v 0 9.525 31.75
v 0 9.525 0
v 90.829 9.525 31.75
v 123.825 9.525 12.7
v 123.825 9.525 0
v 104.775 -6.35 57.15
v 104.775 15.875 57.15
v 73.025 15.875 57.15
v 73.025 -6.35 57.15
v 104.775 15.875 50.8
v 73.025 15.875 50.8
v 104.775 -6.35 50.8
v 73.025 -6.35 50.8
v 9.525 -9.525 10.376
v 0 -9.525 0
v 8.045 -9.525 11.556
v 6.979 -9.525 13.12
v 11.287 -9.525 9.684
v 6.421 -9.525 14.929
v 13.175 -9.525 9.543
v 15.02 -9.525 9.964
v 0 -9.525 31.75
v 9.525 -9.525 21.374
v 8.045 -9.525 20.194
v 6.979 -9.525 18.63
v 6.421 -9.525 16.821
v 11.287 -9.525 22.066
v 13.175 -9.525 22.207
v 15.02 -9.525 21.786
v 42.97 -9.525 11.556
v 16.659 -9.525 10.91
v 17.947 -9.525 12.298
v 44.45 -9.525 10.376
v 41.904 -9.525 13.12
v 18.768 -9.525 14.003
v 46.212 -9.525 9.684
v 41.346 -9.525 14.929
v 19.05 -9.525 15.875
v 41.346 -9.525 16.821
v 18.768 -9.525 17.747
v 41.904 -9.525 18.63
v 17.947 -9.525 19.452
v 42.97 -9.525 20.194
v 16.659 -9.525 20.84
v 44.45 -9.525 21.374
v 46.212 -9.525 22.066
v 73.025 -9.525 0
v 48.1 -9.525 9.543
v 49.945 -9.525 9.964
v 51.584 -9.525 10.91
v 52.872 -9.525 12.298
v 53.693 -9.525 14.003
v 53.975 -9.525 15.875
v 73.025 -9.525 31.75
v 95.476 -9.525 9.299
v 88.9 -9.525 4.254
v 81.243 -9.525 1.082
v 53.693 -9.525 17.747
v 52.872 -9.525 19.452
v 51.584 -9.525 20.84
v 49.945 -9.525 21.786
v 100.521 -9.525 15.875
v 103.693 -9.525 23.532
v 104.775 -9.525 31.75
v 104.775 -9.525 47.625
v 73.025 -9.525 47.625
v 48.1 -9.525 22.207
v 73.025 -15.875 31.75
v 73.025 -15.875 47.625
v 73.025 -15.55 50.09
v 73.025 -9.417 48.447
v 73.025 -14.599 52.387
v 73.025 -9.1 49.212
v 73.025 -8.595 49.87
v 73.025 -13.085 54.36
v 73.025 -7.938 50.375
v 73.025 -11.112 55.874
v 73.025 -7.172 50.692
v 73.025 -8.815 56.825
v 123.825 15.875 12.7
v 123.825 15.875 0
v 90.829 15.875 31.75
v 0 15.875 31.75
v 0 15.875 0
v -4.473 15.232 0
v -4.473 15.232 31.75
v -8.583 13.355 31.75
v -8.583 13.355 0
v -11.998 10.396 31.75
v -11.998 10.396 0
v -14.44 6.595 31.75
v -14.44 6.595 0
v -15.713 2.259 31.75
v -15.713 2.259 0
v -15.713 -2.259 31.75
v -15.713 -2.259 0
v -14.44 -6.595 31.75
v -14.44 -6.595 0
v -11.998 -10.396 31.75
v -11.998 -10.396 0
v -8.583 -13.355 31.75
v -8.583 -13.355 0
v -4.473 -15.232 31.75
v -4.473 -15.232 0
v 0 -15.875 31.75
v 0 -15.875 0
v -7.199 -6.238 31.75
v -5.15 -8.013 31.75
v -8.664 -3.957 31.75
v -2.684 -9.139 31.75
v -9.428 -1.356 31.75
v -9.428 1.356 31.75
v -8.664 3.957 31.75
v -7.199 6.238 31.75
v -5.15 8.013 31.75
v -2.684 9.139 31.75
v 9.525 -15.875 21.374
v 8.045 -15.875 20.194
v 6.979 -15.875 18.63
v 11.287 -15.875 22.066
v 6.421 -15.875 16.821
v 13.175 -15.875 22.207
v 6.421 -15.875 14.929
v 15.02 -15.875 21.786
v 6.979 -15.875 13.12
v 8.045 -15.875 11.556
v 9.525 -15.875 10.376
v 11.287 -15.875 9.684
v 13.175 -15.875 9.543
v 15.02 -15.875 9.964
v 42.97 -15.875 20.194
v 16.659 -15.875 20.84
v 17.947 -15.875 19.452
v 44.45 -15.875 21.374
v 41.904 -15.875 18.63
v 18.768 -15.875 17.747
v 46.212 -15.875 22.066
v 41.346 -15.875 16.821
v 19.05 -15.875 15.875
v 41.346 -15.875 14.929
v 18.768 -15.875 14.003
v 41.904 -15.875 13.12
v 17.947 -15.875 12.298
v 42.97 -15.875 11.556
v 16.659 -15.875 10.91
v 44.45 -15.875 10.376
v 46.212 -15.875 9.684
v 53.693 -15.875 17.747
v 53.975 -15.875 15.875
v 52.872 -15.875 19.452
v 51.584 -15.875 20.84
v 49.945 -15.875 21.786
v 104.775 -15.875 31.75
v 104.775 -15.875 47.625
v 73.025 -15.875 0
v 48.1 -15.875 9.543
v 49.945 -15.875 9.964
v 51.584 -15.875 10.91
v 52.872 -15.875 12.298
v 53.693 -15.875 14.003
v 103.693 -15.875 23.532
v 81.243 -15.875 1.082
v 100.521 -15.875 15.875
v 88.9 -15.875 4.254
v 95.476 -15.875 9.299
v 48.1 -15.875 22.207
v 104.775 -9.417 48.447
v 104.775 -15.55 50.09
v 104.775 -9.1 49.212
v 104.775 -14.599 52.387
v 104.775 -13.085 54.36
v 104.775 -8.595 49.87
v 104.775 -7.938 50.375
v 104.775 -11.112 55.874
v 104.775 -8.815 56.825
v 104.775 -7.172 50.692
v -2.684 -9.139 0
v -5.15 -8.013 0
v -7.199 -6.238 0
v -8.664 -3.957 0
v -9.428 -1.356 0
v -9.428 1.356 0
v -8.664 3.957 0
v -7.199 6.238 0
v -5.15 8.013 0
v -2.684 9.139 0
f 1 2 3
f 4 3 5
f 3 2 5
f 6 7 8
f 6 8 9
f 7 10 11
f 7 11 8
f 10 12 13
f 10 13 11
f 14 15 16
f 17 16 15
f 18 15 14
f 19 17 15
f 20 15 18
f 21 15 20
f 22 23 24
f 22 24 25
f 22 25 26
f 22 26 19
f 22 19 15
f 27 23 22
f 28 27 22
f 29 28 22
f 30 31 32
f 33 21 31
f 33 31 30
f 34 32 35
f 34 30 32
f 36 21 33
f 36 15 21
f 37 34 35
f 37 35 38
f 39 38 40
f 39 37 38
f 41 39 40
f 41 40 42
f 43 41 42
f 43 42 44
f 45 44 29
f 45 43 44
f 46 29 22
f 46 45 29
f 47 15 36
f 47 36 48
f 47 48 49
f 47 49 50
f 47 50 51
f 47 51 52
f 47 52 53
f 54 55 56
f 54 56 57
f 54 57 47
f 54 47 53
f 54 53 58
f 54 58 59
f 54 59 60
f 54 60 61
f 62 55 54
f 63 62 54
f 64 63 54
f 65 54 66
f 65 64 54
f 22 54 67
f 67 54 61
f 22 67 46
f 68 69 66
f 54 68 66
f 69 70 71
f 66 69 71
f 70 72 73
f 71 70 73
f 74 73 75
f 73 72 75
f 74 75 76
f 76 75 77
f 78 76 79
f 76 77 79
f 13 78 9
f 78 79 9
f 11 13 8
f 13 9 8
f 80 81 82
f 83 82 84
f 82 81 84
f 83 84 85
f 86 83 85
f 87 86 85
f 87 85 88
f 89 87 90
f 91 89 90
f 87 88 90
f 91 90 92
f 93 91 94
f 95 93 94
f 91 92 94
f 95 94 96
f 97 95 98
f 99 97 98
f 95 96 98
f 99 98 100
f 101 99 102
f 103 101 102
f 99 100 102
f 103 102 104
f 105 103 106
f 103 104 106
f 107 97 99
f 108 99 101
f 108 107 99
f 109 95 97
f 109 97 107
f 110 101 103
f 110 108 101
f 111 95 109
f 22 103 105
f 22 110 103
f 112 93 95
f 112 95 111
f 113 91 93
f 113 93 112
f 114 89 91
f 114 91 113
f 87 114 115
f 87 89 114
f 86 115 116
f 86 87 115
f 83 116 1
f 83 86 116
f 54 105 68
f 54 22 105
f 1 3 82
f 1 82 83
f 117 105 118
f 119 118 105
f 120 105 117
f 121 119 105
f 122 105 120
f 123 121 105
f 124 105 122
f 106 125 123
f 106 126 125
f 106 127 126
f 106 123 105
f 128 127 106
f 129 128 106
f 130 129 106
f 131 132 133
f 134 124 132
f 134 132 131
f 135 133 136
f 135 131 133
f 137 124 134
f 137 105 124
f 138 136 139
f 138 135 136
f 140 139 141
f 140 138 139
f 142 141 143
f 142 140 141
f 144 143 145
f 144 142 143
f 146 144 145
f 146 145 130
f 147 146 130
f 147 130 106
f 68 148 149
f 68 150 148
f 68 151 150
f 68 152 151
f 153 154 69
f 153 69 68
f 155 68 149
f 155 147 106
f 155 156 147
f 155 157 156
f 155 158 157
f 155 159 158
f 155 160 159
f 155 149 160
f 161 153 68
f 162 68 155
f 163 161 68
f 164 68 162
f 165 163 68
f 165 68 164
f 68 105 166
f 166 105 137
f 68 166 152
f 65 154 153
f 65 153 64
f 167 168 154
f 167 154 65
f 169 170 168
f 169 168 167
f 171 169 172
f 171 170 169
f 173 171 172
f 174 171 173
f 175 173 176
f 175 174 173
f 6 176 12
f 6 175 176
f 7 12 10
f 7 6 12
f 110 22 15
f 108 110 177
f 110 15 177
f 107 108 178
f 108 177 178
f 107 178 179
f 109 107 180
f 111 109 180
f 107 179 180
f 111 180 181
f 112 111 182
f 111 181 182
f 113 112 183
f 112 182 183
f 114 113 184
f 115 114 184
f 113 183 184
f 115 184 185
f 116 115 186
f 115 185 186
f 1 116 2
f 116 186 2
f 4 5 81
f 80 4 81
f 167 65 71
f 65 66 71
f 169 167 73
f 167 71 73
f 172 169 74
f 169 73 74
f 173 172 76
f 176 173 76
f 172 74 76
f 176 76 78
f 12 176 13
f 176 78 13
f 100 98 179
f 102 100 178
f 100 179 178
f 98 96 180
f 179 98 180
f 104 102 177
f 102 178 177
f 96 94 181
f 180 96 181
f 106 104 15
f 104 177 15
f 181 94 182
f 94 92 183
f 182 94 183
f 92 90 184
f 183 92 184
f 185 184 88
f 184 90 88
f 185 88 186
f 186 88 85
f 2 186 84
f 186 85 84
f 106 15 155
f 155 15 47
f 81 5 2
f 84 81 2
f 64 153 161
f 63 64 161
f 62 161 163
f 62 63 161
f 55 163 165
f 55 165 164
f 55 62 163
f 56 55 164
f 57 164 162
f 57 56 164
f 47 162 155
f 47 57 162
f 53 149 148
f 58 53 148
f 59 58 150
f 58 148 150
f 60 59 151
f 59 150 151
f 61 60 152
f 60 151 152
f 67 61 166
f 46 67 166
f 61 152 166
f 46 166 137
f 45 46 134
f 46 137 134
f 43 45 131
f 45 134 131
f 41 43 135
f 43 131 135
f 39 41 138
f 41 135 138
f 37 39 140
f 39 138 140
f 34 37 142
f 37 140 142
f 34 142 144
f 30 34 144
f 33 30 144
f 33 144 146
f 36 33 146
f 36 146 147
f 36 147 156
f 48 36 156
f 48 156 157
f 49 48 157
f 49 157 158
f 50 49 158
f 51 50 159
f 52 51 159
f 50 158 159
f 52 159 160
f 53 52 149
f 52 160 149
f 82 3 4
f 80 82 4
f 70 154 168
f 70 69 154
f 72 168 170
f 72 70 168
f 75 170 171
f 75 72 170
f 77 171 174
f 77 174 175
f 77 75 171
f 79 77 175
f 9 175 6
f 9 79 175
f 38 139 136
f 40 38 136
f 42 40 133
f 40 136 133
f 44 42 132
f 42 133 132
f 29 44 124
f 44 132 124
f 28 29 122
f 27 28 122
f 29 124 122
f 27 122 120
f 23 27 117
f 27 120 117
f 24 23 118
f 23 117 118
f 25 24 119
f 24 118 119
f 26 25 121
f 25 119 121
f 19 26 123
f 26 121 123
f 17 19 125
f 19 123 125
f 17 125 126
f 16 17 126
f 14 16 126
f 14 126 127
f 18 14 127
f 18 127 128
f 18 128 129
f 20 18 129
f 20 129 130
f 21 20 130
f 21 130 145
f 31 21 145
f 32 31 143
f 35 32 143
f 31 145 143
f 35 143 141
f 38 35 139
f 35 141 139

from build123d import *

# Parameters (mm, degrees)
F1_DEPTH  = 31.75
F3_DEPTH  = 25.4
F5_DEPTH  = 31.75
F7_R      = 31.75
F8_R      = 9.525
F9_R      = 3.175
F10_R     = 6.35
F11_DEPTH = 6.35


with BuildPart() as f1:
    # F0 (on Top) → F1 (new body)
    with BuildSketch(Plane.XY):
        with BuildLine():
            Line((123.825, 15.875), (0, 15.875))
            ThreePointArc((0, 15.875), (-15.875, 0), (0, -15.875))
            Line((0, -15.875), (104.775, -15.875))
            Line((104.775, -15.875), (104.775, -9.525))
            Line((104.775, -9.525), (0, -9.525))
            ThreePointArc((0, -9.525), (-9.525, 0), (0, 9.525))
            Line((0, 9.525), (123.825, 9.525))
            Line((123.825, 9.525), (123.825, 15.875))
        make_face()
    extrude(amount=F1_DEPTH)

    # F2 (on face) → F3 (cut)
    with BuildSketch(Plane.XZ.offset(-9.525)):
        Polygon((123.825, 31.75), (90.829432, 31.75), (123.825, 12.7), align=None)
    extrude(amount=-F3_DEPTH, mode=Mode.SUBTRACT)


with BuildPart() as f5:
    # F4 (on face) → F5 (new body)
    with BuildSketch(Plane.YZ.offset(104.775)):
        Polygon((-15.875, 57.15), (-15.875, 50.8), (-15.875, 31.75), (-9.525, 31.75), (-9.525, 50.8), (15.875, 50.8), (15.875, 57.15), align=None)
    extrude(amount=-F5_DEPTH)


with BuildPart() as f1_1:
    add(f1.part)

    # F6: union F5
    add(f5.part)

    # F7
    f7_edges = [f1_1.edges().sort_by_distance(p)[0] for p in [
        (104.775, -12.7, 0),
    ]]
    fillet(f7_edges, radius=F7_R)

    # F8
    f8_edges = [f1_1.edges().sort_by_distance(p)[0] for p in [
        (88.9, -15.875, 57.15),
    ]]
    fillet(f8_edges, radius=F8_R)

    # F9
    f9_edges = [f1_1.edges().sort_by_distance(p)[0] for p in [
        (88.9, -9.525, 50.8),
    ]]
    fillet(f9_edges, radius=F9_R)

    # F10 (on face) → F11 (cut)
    with BuildSketch(Plane.XZ.offset(15.875)):
        with Locations((12.7, 15.875)):
            Circle(F10_R)
        with Locations((47.625, 15.875)):
            Circle(F10_R)
    extrude(amount=-F11_DEPTH, mode=Mode.SUBTRACT)


solid = f1_1.part
